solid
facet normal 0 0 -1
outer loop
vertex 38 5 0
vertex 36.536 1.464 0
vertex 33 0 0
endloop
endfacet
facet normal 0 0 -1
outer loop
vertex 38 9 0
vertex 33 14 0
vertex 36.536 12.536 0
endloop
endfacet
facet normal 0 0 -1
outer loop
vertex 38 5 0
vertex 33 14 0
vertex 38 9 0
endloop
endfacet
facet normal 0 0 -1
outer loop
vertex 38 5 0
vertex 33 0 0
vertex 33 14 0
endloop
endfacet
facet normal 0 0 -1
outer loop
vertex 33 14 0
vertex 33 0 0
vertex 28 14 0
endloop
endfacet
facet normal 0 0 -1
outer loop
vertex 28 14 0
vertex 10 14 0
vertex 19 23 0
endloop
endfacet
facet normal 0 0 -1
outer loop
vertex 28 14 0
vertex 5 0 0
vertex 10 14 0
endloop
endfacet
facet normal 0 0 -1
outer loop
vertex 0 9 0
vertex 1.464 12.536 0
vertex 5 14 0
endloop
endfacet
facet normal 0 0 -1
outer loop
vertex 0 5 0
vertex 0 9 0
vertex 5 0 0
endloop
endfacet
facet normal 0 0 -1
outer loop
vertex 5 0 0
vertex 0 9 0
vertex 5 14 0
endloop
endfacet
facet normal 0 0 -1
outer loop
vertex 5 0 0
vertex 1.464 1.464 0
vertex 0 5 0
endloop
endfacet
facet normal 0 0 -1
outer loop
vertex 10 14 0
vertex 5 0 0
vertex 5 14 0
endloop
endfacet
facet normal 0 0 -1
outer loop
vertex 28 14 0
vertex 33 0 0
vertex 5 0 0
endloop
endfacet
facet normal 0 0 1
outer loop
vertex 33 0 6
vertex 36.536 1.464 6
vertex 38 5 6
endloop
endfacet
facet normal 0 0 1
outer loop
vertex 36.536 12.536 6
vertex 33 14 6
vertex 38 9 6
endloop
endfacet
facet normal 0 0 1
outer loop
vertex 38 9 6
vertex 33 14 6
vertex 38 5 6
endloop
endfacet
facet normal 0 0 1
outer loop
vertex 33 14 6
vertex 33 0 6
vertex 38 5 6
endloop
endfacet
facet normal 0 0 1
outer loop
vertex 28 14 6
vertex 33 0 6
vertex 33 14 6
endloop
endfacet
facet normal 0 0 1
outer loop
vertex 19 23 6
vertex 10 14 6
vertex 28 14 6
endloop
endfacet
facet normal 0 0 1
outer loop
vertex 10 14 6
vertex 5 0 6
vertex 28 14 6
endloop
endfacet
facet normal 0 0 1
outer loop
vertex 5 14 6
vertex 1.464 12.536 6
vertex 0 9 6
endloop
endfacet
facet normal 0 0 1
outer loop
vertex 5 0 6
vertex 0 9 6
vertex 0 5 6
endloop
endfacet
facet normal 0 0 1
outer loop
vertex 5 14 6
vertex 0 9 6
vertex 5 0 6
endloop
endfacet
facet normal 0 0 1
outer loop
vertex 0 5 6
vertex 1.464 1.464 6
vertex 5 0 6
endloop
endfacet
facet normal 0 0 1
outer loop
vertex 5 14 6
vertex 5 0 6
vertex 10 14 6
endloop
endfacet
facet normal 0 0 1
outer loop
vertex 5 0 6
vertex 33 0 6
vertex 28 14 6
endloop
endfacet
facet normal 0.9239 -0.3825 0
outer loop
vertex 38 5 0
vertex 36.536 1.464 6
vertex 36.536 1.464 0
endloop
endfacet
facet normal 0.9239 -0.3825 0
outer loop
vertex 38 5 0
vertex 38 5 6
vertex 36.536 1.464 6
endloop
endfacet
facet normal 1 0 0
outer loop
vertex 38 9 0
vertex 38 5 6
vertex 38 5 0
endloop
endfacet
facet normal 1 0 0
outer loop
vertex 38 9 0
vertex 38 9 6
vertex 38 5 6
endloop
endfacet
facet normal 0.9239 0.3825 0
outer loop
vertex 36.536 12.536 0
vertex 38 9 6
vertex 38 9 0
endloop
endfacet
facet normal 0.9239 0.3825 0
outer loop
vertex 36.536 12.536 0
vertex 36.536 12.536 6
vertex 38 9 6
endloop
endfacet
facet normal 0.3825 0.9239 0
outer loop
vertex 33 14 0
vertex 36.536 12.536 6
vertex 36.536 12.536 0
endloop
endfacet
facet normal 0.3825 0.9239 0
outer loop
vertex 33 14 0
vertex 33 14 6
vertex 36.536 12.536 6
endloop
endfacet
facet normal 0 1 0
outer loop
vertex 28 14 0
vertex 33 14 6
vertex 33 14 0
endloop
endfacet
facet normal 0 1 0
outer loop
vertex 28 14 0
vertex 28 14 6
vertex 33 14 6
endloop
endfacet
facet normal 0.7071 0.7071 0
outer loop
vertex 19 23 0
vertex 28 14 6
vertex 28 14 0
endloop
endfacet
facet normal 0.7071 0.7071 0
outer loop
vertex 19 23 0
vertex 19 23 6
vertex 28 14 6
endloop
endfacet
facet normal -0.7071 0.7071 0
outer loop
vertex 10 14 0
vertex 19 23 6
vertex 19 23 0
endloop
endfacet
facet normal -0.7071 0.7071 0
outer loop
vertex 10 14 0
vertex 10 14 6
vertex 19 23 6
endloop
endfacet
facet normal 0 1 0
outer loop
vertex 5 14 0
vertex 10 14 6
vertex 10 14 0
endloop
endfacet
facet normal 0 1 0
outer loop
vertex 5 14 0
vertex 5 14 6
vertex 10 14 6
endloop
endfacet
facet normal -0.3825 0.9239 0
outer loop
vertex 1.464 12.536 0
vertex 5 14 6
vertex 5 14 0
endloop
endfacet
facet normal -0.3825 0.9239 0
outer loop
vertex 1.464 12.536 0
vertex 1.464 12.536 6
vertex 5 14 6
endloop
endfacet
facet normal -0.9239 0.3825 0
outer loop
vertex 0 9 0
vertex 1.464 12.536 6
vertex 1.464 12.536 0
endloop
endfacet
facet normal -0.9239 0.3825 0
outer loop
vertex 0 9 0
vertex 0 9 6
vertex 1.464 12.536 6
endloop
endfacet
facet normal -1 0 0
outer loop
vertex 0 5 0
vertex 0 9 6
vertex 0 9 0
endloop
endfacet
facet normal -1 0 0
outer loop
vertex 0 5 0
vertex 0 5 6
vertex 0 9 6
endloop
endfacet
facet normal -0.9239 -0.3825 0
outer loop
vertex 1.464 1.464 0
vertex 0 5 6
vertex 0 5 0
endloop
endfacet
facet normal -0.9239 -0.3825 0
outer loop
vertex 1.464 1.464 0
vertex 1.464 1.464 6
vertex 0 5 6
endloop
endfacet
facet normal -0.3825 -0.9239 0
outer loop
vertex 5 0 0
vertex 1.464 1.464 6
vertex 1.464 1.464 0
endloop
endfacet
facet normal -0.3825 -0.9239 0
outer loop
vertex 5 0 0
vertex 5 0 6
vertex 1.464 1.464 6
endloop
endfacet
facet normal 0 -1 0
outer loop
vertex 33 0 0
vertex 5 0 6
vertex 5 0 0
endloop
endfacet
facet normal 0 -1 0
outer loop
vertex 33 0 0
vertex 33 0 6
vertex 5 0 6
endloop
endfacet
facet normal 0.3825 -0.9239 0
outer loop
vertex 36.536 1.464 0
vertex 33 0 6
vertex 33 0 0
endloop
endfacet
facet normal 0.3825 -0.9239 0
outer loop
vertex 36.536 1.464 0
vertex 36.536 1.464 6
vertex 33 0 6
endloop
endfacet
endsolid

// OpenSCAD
$fn = 32;

// ----------------------------------------------------------------------
// Ratchet pawl: 38 x 14 mm body, beak 9 mm сверху
// ----------------------------------------------------------------------

// --- parameters (mm) ---
profile_height = 6;       // extrusion height
profile_points = 15;      // points of the closed outline

profile = [[0, 5], [1.464, 1.464], [5, 0], [33, 0], [36.536, 1.464], [38, 5], [38, 9], [36.536, 12.536], [33, 14], [28, 14], [19, 23], [10, 14], [5, 14], [1.464, 12.536], [0, 9]];  // single closed polygon, 15 points, counter clockwise

// --- the one profile operation ---
linear_extrude(height = profile_height) polygon(points = profile);
